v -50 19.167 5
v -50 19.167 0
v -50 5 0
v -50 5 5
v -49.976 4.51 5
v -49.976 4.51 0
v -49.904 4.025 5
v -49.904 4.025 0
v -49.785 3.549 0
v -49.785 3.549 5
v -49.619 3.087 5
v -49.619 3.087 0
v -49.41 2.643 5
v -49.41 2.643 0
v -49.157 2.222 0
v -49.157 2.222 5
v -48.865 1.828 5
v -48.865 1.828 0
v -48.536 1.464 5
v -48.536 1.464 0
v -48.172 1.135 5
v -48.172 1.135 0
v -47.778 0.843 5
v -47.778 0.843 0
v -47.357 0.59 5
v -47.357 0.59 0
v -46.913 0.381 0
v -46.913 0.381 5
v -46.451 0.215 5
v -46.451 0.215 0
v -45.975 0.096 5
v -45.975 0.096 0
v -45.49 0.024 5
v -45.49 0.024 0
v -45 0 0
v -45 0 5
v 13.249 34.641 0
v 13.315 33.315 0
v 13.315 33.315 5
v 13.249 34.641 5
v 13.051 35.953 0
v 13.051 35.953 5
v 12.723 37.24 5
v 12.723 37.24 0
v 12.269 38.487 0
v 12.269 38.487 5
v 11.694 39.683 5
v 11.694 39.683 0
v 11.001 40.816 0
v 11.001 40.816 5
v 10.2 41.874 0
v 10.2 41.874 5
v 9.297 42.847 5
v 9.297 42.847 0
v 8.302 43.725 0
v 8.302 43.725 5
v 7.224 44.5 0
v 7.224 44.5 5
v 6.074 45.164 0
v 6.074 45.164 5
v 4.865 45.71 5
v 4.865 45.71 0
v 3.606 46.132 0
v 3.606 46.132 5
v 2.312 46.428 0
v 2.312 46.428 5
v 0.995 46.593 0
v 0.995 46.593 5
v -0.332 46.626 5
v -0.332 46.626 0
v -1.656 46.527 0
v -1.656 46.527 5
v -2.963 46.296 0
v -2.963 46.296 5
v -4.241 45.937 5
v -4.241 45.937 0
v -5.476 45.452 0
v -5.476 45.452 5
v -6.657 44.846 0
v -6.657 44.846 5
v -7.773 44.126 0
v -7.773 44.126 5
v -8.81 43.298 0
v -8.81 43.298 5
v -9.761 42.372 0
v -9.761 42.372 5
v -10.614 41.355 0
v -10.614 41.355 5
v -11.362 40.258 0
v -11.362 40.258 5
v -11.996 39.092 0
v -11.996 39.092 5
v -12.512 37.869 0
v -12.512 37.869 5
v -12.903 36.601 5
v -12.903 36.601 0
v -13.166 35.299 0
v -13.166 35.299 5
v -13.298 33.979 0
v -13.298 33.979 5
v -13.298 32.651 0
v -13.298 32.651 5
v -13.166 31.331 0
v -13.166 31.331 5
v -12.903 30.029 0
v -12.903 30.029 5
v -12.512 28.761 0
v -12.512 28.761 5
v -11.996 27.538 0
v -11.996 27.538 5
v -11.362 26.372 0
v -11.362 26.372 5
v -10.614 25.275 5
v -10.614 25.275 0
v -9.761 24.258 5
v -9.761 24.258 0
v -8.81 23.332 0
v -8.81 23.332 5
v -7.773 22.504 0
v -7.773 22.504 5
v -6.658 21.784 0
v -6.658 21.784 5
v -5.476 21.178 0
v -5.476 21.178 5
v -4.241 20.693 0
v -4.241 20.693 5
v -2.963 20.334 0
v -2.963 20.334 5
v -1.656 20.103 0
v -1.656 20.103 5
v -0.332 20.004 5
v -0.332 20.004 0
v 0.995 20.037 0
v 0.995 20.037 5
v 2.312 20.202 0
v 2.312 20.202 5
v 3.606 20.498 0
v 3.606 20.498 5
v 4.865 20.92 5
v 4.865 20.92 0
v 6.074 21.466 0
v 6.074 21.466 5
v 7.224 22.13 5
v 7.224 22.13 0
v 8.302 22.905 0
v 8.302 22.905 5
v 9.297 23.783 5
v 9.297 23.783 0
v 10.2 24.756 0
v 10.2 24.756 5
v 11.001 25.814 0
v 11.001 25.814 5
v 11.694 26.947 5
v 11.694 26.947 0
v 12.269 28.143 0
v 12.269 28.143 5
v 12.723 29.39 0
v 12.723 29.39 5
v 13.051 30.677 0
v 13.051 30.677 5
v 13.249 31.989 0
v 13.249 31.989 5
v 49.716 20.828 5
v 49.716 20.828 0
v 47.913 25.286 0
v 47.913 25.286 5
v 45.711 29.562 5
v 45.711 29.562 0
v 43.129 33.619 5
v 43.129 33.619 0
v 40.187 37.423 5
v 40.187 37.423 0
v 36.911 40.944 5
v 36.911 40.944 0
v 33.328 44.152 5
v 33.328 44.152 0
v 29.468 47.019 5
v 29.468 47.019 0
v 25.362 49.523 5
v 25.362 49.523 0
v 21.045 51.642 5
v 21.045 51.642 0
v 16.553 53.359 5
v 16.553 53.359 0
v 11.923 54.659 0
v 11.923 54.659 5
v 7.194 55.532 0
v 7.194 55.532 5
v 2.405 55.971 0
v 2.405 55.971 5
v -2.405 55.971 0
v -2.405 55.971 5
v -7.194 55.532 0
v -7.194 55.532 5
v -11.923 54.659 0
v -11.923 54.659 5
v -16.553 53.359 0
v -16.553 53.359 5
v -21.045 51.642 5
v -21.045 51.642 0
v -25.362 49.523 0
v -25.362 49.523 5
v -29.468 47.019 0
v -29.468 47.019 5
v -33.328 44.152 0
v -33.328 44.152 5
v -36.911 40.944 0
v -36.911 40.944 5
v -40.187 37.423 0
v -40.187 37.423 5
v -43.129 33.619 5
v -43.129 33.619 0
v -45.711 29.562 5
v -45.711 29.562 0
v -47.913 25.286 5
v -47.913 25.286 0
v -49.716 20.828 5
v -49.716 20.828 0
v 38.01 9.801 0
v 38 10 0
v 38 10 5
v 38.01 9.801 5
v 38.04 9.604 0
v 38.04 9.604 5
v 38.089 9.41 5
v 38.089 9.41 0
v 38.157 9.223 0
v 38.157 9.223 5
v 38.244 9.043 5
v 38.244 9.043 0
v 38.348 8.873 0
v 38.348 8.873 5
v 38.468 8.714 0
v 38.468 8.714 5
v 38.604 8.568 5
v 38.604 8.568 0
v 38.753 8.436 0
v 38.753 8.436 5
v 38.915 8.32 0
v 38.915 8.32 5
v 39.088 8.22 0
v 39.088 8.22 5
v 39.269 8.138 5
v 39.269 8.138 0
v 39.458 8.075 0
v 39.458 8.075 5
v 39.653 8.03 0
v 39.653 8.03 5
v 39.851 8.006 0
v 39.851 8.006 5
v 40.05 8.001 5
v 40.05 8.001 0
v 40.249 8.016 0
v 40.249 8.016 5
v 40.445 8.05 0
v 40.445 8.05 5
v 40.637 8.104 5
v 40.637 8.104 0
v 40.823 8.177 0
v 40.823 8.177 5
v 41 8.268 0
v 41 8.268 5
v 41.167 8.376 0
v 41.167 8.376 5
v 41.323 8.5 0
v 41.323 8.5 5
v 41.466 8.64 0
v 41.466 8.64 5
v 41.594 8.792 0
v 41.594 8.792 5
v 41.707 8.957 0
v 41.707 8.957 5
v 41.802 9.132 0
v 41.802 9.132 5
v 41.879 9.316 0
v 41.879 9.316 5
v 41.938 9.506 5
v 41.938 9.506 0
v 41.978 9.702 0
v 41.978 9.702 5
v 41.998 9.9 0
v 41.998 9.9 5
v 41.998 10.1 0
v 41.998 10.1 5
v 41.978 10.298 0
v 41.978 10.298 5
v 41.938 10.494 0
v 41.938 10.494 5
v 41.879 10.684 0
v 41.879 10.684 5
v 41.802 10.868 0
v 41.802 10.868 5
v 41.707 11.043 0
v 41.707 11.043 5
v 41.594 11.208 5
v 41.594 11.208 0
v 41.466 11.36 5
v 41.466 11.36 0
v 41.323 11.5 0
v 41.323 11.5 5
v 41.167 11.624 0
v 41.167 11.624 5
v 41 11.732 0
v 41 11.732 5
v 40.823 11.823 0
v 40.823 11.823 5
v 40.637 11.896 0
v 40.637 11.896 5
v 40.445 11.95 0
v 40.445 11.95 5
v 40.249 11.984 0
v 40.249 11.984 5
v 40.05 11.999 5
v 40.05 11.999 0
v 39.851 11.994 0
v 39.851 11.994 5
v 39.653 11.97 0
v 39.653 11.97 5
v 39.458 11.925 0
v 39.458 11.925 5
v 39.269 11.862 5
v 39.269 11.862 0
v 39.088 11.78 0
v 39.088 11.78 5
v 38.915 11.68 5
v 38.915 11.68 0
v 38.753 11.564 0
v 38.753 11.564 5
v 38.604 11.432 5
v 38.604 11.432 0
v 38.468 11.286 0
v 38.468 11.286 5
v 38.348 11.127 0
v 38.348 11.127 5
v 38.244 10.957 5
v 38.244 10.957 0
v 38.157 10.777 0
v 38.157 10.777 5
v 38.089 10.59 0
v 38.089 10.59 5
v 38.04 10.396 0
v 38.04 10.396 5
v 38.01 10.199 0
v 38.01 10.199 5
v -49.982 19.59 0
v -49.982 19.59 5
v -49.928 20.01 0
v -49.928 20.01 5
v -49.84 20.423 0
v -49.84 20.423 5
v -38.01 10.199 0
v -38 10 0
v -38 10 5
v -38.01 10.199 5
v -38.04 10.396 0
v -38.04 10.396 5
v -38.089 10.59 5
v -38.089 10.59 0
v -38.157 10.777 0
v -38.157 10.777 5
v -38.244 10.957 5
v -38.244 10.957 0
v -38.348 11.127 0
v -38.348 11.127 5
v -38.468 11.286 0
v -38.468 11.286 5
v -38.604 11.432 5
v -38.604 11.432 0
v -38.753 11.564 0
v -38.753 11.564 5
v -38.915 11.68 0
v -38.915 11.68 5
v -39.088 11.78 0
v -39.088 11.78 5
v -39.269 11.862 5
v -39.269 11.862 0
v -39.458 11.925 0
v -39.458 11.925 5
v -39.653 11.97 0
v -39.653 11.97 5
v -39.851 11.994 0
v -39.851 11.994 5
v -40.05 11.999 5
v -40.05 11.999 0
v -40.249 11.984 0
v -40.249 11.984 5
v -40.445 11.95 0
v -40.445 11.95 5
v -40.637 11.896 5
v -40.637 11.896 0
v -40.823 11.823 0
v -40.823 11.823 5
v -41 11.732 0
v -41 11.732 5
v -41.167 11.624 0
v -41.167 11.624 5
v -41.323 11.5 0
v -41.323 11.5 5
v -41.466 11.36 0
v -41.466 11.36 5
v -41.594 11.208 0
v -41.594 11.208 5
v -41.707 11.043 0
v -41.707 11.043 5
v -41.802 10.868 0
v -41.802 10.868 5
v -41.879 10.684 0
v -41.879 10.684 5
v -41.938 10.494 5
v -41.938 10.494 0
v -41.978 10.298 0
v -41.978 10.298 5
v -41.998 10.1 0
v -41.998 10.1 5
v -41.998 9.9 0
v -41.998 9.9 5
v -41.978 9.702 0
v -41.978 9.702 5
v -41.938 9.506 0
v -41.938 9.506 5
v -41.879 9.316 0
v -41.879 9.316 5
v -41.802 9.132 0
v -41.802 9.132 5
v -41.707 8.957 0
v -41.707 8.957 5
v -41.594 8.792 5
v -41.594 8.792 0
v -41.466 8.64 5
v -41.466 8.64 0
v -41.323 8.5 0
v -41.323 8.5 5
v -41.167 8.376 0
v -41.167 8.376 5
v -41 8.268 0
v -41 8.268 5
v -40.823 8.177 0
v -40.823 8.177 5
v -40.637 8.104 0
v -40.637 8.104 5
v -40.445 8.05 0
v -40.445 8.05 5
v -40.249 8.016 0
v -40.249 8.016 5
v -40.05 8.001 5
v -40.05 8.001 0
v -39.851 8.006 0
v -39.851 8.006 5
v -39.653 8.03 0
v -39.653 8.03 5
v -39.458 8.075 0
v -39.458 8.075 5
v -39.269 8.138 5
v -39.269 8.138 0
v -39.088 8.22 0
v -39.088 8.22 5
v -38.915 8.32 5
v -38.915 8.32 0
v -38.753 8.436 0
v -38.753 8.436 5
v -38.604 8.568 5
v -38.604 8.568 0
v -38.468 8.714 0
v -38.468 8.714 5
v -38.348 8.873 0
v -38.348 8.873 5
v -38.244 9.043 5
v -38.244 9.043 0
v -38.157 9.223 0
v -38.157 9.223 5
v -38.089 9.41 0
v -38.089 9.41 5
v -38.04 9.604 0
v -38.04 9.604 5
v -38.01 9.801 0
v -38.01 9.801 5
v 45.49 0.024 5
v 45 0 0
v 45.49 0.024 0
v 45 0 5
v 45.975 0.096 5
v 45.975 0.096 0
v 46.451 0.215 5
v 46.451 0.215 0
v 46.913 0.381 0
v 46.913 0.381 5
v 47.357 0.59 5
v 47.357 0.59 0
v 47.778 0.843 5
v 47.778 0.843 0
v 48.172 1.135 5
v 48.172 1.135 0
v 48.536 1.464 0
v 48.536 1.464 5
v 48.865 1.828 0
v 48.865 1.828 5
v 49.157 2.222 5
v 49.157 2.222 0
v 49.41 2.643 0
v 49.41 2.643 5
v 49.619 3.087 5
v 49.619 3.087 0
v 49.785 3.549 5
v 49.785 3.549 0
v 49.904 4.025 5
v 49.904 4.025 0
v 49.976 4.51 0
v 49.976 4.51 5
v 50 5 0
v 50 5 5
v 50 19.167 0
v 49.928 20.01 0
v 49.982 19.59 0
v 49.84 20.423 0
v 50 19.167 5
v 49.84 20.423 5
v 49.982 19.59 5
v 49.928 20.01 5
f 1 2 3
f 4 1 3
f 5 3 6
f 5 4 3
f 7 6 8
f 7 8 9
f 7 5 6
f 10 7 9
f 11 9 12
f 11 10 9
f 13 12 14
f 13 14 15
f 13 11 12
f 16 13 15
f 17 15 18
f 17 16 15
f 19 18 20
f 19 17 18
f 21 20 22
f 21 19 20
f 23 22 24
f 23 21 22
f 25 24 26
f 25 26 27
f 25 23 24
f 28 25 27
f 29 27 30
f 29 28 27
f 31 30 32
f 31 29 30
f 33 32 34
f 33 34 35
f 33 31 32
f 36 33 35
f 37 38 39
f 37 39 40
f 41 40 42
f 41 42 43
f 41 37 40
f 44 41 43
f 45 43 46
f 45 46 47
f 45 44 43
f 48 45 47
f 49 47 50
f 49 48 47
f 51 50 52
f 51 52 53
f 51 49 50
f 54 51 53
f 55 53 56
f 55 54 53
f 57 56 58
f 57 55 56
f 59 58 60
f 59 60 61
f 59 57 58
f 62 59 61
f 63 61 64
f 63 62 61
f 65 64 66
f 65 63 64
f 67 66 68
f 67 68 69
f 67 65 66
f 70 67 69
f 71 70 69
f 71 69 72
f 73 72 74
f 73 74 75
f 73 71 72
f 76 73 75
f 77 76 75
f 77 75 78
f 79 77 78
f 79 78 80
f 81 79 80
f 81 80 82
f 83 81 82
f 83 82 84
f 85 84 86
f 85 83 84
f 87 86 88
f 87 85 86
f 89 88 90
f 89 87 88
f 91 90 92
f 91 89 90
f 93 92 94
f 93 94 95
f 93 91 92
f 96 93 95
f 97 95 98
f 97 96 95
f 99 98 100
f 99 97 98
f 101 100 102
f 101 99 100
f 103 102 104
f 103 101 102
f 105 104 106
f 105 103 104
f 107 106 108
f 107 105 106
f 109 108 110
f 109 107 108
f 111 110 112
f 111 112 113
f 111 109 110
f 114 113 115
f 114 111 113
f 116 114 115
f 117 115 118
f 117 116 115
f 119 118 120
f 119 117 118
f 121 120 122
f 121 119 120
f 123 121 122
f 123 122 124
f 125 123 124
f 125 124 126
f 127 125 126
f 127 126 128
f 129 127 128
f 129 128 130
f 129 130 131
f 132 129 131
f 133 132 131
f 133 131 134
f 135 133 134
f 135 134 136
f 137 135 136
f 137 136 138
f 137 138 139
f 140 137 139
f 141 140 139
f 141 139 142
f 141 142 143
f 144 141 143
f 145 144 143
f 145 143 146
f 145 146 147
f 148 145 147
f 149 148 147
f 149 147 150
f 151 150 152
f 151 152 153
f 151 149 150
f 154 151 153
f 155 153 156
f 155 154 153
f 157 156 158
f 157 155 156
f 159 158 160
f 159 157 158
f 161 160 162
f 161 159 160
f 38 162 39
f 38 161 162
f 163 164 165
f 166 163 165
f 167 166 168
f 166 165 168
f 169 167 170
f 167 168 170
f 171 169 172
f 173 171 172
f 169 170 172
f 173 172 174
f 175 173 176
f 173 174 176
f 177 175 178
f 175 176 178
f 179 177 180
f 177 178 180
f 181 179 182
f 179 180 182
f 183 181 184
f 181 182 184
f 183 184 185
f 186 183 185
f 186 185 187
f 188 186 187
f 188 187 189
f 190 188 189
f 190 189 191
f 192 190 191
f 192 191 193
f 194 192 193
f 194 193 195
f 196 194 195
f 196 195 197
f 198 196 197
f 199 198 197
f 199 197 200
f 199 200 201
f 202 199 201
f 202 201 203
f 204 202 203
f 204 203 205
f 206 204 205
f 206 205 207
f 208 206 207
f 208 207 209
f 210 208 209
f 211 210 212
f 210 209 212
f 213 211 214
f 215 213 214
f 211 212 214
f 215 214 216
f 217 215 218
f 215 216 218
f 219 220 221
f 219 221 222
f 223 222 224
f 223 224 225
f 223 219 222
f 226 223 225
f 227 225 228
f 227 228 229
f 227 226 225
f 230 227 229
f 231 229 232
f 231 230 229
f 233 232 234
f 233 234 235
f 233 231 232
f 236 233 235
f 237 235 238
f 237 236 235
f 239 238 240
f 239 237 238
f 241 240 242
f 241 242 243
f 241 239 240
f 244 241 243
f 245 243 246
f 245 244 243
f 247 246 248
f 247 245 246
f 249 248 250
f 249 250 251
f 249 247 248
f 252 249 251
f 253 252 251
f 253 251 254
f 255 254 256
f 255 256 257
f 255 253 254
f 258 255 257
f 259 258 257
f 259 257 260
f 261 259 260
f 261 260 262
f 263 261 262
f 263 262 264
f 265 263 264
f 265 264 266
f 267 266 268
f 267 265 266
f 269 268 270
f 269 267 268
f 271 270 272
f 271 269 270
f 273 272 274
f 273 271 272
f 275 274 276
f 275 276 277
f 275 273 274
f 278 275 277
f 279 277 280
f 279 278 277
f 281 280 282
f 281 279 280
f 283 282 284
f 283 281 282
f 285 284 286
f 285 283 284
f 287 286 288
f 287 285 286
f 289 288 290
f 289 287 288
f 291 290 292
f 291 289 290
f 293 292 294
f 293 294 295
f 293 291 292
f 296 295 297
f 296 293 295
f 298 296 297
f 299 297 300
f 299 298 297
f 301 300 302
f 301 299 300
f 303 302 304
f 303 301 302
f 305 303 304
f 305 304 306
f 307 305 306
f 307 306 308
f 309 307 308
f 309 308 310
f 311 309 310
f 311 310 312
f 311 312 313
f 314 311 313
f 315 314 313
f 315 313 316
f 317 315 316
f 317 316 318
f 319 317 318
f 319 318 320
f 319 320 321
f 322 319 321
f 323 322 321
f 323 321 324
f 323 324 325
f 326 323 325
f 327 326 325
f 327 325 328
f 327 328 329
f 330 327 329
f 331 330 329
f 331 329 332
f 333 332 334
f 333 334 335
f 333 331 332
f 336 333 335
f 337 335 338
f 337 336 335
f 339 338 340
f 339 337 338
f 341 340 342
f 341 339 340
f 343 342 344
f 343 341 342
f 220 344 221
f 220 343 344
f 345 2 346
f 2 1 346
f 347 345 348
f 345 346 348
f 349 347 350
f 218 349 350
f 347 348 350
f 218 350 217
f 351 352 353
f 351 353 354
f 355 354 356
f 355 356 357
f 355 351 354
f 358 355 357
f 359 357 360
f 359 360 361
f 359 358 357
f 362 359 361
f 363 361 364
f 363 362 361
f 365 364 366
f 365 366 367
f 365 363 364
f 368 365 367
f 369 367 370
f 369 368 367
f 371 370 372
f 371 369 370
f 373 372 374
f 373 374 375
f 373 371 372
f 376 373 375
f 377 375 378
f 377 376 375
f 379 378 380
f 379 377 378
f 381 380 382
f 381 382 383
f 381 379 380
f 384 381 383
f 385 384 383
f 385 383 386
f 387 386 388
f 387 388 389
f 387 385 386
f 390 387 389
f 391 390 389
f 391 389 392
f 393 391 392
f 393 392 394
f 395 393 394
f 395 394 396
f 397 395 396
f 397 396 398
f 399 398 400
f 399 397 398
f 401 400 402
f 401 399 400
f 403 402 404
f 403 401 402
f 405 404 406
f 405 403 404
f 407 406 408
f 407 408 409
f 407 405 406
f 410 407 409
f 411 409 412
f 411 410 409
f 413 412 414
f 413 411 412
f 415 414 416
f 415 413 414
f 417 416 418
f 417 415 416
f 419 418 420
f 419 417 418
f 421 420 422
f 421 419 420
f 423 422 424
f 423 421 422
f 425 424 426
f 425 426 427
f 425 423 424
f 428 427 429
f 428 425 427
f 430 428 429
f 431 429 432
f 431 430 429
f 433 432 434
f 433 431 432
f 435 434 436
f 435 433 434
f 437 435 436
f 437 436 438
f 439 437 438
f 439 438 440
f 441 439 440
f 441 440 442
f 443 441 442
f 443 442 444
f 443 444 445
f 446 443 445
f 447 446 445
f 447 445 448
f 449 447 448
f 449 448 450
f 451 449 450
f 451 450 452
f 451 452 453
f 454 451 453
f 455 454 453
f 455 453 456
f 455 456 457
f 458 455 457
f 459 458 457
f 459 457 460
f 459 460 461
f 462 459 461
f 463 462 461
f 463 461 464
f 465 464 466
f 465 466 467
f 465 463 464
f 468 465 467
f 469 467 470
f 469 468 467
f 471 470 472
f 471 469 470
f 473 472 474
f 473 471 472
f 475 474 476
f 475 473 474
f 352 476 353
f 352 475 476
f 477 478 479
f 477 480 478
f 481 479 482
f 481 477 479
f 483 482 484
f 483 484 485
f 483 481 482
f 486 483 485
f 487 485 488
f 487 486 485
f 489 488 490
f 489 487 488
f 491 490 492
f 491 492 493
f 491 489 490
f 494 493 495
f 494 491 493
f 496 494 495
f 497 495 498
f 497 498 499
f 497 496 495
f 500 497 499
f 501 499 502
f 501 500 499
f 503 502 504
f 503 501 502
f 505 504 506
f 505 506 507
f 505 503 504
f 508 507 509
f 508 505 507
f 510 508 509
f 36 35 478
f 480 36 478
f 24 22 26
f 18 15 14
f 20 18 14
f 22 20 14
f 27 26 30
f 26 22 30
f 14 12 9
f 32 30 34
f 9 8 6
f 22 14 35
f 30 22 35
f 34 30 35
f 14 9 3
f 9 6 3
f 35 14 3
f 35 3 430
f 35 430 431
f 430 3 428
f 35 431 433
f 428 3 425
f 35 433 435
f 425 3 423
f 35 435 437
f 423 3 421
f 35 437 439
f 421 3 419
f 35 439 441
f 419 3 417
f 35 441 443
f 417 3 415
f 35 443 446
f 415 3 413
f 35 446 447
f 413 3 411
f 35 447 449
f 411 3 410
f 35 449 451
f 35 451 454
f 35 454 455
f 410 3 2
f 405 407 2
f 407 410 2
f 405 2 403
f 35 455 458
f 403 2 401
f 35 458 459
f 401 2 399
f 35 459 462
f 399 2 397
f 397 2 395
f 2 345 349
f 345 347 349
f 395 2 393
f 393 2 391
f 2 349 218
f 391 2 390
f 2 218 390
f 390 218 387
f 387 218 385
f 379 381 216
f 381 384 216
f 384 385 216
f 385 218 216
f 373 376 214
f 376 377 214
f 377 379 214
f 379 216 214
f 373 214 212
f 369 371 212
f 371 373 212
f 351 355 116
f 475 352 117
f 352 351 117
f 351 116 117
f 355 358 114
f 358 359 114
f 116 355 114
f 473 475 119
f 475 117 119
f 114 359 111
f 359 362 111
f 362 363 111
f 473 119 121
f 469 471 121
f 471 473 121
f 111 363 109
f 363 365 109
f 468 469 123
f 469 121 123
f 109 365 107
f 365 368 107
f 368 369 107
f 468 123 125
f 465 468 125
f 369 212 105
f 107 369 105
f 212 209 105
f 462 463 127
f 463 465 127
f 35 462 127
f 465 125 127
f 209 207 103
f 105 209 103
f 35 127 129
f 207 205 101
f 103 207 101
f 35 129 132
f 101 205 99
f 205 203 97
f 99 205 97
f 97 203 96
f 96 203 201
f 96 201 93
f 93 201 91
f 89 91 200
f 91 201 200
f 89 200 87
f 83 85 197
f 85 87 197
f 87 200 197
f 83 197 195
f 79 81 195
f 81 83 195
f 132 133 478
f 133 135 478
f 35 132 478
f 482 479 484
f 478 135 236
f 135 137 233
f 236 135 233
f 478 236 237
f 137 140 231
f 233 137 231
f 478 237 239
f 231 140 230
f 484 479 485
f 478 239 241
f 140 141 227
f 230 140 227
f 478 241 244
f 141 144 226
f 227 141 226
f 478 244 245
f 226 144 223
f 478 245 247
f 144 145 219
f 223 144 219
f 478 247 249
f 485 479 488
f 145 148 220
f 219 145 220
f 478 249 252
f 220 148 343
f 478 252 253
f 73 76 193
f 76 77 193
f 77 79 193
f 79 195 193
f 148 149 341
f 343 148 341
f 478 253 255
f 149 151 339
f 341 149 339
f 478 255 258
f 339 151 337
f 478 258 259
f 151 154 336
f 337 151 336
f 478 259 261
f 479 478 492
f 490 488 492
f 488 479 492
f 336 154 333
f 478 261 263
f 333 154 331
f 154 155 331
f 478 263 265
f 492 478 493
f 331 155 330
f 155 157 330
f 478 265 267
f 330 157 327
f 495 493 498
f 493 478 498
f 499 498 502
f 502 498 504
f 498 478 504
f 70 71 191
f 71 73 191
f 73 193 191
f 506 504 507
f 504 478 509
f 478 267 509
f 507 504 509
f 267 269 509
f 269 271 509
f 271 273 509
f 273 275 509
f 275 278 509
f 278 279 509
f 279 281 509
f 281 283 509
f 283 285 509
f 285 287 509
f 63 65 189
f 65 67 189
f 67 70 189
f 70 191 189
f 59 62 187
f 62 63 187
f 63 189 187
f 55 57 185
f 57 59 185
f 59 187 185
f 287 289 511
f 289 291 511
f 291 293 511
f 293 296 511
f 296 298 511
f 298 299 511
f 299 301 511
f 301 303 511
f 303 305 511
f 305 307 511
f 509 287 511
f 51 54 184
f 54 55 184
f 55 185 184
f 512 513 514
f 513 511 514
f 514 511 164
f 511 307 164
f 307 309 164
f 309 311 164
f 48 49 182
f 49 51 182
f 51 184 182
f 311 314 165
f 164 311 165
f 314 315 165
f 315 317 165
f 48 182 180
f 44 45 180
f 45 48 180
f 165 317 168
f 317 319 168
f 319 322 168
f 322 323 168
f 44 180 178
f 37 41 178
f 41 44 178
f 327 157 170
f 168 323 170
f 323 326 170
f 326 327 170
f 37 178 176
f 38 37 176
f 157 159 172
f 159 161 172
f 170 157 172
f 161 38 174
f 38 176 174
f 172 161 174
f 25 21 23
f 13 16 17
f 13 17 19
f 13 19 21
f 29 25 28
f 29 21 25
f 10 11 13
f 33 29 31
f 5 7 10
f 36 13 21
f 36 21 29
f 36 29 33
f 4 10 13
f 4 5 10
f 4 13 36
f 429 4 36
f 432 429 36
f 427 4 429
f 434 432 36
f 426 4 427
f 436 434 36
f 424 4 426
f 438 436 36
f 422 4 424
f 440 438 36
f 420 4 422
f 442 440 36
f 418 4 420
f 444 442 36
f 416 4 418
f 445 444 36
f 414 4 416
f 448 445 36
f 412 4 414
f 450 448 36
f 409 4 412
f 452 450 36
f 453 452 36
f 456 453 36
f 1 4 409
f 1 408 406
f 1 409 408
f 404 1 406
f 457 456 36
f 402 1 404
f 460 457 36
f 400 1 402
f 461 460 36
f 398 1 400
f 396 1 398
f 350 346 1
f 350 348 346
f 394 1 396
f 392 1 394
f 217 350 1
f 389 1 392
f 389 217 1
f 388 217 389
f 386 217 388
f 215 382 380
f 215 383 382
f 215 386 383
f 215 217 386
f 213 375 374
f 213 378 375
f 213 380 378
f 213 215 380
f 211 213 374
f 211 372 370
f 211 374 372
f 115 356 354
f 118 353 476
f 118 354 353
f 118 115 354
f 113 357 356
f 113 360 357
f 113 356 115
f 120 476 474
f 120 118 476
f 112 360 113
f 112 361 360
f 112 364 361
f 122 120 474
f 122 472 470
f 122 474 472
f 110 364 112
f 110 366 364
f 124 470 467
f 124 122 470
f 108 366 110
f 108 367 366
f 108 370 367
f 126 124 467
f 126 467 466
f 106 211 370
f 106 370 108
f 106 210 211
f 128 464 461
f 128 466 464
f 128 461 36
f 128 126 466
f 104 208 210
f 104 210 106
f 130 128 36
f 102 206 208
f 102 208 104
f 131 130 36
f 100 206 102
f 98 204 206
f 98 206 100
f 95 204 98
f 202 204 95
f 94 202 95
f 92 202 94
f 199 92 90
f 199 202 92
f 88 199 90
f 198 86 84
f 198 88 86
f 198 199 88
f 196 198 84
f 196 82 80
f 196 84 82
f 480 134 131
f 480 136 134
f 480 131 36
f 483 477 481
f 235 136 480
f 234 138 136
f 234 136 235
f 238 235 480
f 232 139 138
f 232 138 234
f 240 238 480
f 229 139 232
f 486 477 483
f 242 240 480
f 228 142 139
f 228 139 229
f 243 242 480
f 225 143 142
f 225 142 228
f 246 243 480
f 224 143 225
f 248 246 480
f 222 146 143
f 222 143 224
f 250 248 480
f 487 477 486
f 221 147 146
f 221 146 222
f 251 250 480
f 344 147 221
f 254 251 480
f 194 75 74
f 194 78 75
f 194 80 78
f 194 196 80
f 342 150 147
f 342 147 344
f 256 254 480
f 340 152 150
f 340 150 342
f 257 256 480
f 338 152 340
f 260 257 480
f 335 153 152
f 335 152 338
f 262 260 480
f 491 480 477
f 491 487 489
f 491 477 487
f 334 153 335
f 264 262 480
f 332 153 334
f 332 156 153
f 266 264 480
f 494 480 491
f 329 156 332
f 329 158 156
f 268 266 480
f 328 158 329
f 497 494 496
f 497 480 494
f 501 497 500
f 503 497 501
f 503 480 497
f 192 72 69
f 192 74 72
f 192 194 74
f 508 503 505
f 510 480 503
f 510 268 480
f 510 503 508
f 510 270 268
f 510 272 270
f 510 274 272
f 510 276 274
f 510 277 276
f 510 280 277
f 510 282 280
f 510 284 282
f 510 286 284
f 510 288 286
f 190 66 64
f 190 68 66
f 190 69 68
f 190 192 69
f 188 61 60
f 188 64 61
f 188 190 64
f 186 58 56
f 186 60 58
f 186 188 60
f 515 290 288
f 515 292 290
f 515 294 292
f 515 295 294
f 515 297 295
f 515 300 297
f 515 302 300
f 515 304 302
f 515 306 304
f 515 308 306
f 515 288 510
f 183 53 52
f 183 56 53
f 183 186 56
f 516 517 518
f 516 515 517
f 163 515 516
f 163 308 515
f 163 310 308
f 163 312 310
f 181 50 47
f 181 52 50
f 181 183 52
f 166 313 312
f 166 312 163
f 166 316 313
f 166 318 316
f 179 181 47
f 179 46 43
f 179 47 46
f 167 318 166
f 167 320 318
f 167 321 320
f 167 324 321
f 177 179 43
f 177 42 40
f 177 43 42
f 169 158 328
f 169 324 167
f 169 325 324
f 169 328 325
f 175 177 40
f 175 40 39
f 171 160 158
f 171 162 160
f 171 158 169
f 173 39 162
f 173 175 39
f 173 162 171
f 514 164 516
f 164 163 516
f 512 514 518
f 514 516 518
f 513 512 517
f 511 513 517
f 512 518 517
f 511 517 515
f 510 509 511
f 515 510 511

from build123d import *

# Parameters (mm, degrees)
ESQUISSE2_R        = 2
ESQUISSE2_R_2      = 13.315
BOSS_EXTRU_1_DEPTH = 5
CONG_1_R           = 5


with BuildPart() as part:
    # Esquisse2 → Boss.-Extru.1 (new body)
    with BuildSketch(Plane.XY):
        with BuildLine():
            Line((-50, 20), (-50, 0))
            Line((-50, 0), (50, 0))
            Line((50, 0), (50, 20))
            ThreePointArc((50, 20), (0, 56.025428048), (-50, 20))
        make_face()
        with Locations((-40, 10)):
            Circle(ESQUISSE2_R, mode=Mode.SUBTRACT)
        with Locations(Location((40, 10, 0), (0, 0, 180))):
            Circle(ESQUISSE2_R, mode=Mode.SUBTRACT)
        with Locations((0, 33.315)):
            Circle(ESQUISSE2_R_2, mode=Mode.SUBTRACT)
    extrude(amount=BOSS_EXTRU_1_DEPTH)

    # Congé1
    cong_1_edges = [part.edges().sort_by_distance(p)[0] for p in [
        (50, 20, 2.5),
        (50, 0, 2.5),
        (-50, 0, 2.5),
        (-50, 20, 2.5),
    ]]
    fillet(cong_1_edges, radius=CONG_1_R)


solid = part.part
